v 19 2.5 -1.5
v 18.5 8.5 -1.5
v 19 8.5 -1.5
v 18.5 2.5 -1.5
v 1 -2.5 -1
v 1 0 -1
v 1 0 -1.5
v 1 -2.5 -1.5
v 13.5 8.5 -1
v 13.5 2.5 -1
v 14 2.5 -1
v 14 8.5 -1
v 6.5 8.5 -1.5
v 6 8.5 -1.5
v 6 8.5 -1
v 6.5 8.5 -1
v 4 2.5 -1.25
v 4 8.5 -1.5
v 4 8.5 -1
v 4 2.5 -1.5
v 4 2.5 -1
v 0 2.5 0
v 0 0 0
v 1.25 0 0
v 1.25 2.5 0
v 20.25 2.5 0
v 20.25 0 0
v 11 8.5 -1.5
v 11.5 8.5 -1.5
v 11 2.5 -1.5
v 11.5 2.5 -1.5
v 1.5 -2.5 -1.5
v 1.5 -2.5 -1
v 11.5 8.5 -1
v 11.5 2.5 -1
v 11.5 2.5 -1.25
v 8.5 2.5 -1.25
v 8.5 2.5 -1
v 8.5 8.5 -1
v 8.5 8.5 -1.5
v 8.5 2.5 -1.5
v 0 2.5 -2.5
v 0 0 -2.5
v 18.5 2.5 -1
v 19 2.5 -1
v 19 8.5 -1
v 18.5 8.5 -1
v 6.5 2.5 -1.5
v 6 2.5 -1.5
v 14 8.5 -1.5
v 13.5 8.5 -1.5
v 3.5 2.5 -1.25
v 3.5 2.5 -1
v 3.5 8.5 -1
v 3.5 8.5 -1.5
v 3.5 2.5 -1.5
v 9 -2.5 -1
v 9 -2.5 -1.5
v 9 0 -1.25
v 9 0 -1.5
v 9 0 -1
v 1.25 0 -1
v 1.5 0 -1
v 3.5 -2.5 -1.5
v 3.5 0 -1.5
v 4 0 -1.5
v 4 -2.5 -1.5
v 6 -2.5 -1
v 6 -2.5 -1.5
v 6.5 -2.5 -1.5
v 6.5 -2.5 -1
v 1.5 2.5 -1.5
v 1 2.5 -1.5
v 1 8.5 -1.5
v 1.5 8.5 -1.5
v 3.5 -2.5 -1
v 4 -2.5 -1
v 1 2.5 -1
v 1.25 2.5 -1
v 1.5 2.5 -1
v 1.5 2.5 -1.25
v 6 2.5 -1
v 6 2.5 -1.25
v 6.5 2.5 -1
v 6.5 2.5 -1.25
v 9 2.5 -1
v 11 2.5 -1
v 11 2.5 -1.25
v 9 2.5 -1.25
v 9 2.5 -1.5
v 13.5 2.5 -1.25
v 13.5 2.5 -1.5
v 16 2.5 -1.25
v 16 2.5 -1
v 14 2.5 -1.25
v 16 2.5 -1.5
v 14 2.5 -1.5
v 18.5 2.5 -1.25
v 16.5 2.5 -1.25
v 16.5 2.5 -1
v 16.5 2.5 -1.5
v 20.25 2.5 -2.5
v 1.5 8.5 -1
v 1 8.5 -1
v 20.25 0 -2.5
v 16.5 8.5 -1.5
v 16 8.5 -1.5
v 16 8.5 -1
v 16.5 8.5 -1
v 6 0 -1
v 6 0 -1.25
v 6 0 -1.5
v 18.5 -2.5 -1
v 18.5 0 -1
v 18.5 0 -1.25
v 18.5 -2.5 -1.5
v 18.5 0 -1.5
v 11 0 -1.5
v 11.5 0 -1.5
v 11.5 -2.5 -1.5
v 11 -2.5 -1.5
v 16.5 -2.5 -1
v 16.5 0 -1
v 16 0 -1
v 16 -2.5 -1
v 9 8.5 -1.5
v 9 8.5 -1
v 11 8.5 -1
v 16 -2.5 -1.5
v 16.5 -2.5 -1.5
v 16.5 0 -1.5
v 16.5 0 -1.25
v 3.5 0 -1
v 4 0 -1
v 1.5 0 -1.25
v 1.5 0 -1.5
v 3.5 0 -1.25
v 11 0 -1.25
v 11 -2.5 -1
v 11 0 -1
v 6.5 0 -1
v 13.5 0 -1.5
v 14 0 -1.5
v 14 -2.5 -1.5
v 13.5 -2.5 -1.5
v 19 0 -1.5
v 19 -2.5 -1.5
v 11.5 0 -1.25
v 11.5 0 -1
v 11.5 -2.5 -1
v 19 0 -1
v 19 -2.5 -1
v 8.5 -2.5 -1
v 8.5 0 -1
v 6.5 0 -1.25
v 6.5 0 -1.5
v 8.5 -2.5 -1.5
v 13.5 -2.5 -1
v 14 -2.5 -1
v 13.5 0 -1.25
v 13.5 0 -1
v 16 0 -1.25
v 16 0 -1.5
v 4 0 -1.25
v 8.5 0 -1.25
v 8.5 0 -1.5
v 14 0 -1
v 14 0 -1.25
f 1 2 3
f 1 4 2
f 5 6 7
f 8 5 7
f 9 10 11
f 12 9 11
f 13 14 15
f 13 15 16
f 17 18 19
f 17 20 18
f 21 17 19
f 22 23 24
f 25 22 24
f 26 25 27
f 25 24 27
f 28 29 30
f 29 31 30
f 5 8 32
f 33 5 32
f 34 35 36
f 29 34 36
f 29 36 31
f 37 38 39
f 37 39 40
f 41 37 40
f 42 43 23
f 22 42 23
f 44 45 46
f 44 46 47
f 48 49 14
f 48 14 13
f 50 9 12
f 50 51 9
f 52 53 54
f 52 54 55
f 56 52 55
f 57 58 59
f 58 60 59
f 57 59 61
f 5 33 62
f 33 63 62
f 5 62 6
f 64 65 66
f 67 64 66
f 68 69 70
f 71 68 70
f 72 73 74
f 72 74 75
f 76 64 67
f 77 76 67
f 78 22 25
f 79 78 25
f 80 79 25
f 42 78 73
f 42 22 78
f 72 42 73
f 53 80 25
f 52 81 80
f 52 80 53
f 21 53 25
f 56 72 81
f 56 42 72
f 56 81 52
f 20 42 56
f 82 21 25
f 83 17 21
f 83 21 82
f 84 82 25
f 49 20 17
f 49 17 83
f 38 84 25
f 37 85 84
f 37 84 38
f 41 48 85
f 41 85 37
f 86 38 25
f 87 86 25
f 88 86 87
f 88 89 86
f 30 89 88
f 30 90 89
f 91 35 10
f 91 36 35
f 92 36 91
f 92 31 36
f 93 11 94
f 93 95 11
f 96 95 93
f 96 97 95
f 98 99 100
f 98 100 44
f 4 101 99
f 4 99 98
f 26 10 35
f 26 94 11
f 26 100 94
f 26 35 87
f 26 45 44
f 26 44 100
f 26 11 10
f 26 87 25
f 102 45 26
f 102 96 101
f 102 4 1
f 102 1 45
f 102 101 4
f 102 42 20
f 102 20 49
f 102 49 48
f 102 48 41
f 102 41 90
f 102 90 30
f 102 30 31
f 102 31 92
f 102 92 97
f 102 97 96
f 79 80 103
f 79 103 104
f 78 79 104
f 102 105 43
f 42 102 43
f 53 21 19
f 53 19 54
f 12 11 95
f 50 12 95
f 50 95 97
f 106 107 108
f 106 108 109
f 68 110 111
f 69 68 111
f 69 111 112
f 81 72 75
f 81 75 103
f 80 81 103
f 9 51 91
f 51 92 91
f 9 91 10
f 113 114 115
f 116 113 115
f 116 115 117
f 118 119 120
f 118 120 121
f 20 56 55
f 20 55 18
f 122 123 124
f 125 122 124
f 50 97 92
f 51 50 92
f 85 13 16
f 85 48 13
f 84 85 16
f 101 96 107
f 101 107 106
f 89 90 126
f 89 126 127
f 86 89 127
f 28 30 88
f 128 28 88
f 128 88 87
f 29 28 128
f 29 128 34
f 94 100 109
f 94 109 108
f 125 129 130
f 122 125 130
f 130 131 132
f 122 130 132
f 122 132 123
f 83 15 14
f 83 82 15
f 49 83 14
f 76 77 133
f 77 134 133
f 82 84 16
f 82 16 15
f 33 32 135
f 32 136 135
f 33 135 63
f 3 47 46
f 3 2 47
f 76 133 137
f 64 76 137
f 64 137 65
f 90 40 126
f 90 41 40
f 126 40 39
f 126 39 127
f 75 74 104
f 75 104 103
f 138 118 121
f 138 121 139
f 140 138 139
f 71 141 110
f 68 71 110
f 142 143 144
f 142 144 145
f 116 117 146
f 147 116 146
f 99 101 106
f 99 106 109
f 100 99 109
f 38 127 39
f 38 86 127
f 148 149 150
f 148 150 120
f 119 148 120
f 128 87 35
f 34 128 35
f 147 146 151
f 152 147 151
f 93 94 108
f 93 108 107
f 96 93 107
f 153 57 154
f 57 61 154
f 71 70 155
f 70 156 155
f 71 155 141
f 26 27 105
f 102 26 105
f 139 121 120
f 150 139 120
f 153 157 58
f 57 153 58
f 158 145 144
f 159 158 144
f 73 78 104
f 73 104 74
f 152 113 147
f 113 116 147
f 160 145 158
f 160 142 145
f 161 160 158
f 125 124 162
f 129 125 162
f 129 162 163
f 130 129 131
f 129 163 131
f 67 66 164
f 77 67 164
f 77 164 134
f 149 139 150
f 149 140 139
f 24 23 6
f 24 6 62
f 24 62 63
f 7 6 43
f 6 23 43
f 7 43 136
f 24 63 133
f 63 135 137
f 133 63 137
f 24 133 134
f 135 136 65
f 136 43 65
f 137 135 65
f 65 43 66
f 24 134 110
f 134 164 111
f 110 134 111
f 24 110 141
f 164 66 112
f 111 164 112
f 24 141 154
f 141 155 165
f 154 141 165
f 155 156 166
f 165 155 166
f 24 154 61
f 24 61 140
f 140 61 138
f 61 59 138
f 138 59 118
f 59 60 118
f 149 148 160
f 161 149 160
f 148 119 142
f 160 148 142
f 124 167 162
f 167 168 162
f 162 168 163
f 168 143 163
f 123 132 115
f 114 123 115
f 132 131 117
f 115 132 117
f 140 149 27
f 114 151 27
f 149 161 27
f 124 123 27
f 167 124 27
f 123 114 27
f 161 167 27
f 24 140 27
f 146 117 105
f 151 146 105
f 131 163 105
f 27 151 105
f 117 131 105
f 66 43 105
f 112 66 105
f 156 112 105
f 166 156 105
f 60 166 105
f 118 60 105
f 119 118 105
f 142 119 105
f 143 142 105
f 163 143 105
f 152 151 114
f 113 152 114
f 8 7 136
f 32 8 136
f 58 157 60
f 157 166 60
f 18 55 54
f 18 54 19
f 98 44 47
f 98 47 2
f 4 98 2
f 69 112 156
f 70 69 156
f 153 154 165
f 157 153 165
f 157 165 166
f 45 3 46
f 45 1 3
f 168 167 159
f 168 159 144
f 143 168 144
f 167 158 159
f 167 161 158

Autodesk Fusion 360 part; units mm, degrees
sketch "Sketch1" plane through (0, 0, 0) normal (0, 1, 0) x (1, 0, 0)
  line L0 (0, 0) -> (20.25, 0)
  line L1 (20.25, 0) -> (20.25, 2.5)
  line L2 (20.25, 2.5) -> (0, 2.5)
  line L3 (0, 2.5) -> (0, 0)
  line L4 (0, 0) -> (1.25, 0)
  line L5 (1.25, 0) -> (1.25, 1.25)
  line L6 (1.5, 1) -> (1, 1)
  line L7 (1, 1) -> (1, 1.5)
  line L8 (1, 1.5) -> (1.5, 1.5)
  line L9 (1.5, 1.5) -> (1.5, 1)
  line L10 (1.5, 1) -> (1, 1.5) construction
  line L11 (1, 1) -> (1.5, 1.5) construction
  line L12 (1.25, 1.25) -> (3.75, 1.25)
  line L13 (4, 1) -> (3.5, 1)
  line L14 (3.5, 1) -> (3.5, 1.5)
  line L15 (3.5, 1.5) -> (4, 1.5)
  line L16 (4, 1.5) -> (4, 1)
  line L17 (4, 1) -> (3.5, 1.5) construction
  line L18 (3.5, 1) -> (4, 1.5) construction
  line L19 (3.75, 1.25) -> (6.25, 1.25)
  line L20 (6.5, 1) -> (6, 1)
  line L21 (6, 1) -> (6, 1.5)
  line L22 (6, 1.5) -> (6.5, 1.5)
  line L23 (6.5, 1.5) -> (6.5, 1)
  line L24 (6.5, 1) -> (6, 1.5) construction
  line L25 (6, 1) -> (6.5, 1.5) construction
  line L26 (6.25, 1.25) -> (8.75, 1.25)
  line L27 (9, 1) -> (8.5, 1)
  line L28 (8.5, 1) -> (8.5, 1.5)
  line L29 (8.5, 1.5) -> (9, 1.5)
  line L30 (9, 1.5) -> (9, 1)
  line L31 (9, 1) -> (8.5, 1.5) construction
  line L32 (8.5, 1) -> (9, 1.5) construction
  line L33 (8.75, 1.25) -> (11.25, 1.25)
  line L34 (11.5, 1.5) -> (11, 1.5)
  line L35 (11, 1.5) -> (11, 1)
  line L36 (11, 1) -> (11.5, 1)
  line L37 (11.5, 1) -> (11.5, 1.5)
  line L38 (11.5, 1.5) -> (11, 1) construction
  line L39 (11, 1.5) -> (11.5, 1) construction
  line L40 (11.25, 1.25) -> (13.75, 1.25)
  line L41 (14, 1.5) -> (13.5, 1.5)
  line L42 (13.5, 1.5) -> (13.5, 1)
  line L43 (13.5, 1) -> (14, 1)
  line L44 (14, 1) -> (14, 1.5)
  line L45 (14, 1.5) -> (13.5, 1) construction
  line L46 (13.5, 1.5) -> (14, 1) construction
  line L47 (13.75, 1.25) -> (16.25, 1.25)
  line L48 (16.5, 1) -> (16, 1)
  line L49 (16, 1) -> (16, 1.5)
  line L50 (16, 1.5) -> (16.5, 1.5)
  line L51 (16.5, 1.5) -> (16.5, 1)
  line L52 (16.5, 1) -> (16, 1.5) construction
  line L53 (16, 1) -> (16.5, 1.5) construction
  line L54 (16.25, 1.25) -> (18.75, 1.25)
  line L55 (19, 1) -> (18.5, 1)
  line L56 (18.5, 1) -> (18.5, 1.5)
  line L57 (18.5, 1.5) -> (19, 1.5)
  line L58 (19, 1.5) -> (19, 1)
  line L59 (19, 1) -> (18.5, 1.5) construction
  line L60 (18.5, 1) -> (19, 1.5) construction
  point P0 (1.25, 1.25)
  point P1 (3.75, 1.25)
  point P2 (6.25, 1.25)
  point P3 (8.75, 1.25)
  point P4 (11.25, 1.25)
  point P5 (13.75, 1.25)
  point P6 (16.25, 1.25)
  point P7 (18.75, 1.25)
  dimension "d1" = 20.25
  dimension "d2" = 0.5
  dimension "d3" = 0.5
  dimension "d4" = 0.5
  dimension "d5" = 0.5
  dimension "d6" = 2.5
  dimension "d7" = 0.5
  dimension "d8" = 0.5
  dimension "d9" = 0.5
  dimension "d10" = 0.5
  dimension "d11" = 2.5
  dimension "d12" = 0.5
  dimension "d13" = 0.5
  dimension "d14" = 2.5
  dimension "d15" = 0.5
  dimension "d16" = 0.5
  dimension "d17" = 2.5
  dimension "d18" = 0.5
  dimension "d19" = 0.5
  dimension "d24" = 2.5
  dimension "d25" = 1.25
  dimension "d26" = 1.25
  dimension "d27" = 2.5
  dimension "d28" = 2.5
  dimension "d29" = 2.5
extrude "Extrude1" add sketch "Sketch1" along normal blind 2.5 makes body 1
extrude "Extrude2" add sketch "Sketch1" along normal blind 8.5 separate body contours L5 L6 L7 L8 L9 L12 | L5 L6 L9 L12 | L12 L14 L15 L16 L19 | L12 L13 L14 L16 L19 | L19 L21 L22 L23 L26 | L19 L20 L21 L23 L26 | L26 L28 L29 L30 L33 | L26 L27 L28 L30 L33 | L33 L34 L35 L37 L40 | L33 L35 L36 L37 L40 | L40 L41 L42 L44 L47 | L40 L42 L43 L44 L47 | L47 L49 L50 L51 L54 | L47 L48 L49 L51 L54 | L55 L56 L57 L58 makes body 2 at (13.6667, 2.8333, -1) makes body 3 at (3.6667, 2.8333, -1.5) makes body 4 at (6, 2.8333, -1.1667) makes body 5 at (16, 2.8333, -1.1667) makes body 6 at (11.1667, 2.8333, -1) makes body 7 at (1.5, 2.8333, -1.3333) makes body 8 at (8.5, 2.8333, -1.1667) makes body 9 at (18.5, 2.8333, -1.1667)
extrude "Extrude3" add sketch "Sketch1" against normal blind 2.5 contours L5 L6 L7 L8 L9 L12 | L5 L6 L9 L12 | L12 L14 L15 L16 L19 | L12 L13 L14 L16 L19 | L19 L21 L22 L23 L26 | L19 L20 L21 L23 L26 | L26 L28 L29 L30 L33 | L26 L27 L28 L30 L33 | L33 L34 L35 L37 L40 | L33 L35 L36 L37 L40 | L40 L41 L42 L44 L47 | L40 L42 L43 L44 L47 | L47 L49 L50 L51 L54 | L47 L48 L49 L51 L54 | L55 L56 L57 L58 bodies 2 1 3 4 5 6 7 8 9
